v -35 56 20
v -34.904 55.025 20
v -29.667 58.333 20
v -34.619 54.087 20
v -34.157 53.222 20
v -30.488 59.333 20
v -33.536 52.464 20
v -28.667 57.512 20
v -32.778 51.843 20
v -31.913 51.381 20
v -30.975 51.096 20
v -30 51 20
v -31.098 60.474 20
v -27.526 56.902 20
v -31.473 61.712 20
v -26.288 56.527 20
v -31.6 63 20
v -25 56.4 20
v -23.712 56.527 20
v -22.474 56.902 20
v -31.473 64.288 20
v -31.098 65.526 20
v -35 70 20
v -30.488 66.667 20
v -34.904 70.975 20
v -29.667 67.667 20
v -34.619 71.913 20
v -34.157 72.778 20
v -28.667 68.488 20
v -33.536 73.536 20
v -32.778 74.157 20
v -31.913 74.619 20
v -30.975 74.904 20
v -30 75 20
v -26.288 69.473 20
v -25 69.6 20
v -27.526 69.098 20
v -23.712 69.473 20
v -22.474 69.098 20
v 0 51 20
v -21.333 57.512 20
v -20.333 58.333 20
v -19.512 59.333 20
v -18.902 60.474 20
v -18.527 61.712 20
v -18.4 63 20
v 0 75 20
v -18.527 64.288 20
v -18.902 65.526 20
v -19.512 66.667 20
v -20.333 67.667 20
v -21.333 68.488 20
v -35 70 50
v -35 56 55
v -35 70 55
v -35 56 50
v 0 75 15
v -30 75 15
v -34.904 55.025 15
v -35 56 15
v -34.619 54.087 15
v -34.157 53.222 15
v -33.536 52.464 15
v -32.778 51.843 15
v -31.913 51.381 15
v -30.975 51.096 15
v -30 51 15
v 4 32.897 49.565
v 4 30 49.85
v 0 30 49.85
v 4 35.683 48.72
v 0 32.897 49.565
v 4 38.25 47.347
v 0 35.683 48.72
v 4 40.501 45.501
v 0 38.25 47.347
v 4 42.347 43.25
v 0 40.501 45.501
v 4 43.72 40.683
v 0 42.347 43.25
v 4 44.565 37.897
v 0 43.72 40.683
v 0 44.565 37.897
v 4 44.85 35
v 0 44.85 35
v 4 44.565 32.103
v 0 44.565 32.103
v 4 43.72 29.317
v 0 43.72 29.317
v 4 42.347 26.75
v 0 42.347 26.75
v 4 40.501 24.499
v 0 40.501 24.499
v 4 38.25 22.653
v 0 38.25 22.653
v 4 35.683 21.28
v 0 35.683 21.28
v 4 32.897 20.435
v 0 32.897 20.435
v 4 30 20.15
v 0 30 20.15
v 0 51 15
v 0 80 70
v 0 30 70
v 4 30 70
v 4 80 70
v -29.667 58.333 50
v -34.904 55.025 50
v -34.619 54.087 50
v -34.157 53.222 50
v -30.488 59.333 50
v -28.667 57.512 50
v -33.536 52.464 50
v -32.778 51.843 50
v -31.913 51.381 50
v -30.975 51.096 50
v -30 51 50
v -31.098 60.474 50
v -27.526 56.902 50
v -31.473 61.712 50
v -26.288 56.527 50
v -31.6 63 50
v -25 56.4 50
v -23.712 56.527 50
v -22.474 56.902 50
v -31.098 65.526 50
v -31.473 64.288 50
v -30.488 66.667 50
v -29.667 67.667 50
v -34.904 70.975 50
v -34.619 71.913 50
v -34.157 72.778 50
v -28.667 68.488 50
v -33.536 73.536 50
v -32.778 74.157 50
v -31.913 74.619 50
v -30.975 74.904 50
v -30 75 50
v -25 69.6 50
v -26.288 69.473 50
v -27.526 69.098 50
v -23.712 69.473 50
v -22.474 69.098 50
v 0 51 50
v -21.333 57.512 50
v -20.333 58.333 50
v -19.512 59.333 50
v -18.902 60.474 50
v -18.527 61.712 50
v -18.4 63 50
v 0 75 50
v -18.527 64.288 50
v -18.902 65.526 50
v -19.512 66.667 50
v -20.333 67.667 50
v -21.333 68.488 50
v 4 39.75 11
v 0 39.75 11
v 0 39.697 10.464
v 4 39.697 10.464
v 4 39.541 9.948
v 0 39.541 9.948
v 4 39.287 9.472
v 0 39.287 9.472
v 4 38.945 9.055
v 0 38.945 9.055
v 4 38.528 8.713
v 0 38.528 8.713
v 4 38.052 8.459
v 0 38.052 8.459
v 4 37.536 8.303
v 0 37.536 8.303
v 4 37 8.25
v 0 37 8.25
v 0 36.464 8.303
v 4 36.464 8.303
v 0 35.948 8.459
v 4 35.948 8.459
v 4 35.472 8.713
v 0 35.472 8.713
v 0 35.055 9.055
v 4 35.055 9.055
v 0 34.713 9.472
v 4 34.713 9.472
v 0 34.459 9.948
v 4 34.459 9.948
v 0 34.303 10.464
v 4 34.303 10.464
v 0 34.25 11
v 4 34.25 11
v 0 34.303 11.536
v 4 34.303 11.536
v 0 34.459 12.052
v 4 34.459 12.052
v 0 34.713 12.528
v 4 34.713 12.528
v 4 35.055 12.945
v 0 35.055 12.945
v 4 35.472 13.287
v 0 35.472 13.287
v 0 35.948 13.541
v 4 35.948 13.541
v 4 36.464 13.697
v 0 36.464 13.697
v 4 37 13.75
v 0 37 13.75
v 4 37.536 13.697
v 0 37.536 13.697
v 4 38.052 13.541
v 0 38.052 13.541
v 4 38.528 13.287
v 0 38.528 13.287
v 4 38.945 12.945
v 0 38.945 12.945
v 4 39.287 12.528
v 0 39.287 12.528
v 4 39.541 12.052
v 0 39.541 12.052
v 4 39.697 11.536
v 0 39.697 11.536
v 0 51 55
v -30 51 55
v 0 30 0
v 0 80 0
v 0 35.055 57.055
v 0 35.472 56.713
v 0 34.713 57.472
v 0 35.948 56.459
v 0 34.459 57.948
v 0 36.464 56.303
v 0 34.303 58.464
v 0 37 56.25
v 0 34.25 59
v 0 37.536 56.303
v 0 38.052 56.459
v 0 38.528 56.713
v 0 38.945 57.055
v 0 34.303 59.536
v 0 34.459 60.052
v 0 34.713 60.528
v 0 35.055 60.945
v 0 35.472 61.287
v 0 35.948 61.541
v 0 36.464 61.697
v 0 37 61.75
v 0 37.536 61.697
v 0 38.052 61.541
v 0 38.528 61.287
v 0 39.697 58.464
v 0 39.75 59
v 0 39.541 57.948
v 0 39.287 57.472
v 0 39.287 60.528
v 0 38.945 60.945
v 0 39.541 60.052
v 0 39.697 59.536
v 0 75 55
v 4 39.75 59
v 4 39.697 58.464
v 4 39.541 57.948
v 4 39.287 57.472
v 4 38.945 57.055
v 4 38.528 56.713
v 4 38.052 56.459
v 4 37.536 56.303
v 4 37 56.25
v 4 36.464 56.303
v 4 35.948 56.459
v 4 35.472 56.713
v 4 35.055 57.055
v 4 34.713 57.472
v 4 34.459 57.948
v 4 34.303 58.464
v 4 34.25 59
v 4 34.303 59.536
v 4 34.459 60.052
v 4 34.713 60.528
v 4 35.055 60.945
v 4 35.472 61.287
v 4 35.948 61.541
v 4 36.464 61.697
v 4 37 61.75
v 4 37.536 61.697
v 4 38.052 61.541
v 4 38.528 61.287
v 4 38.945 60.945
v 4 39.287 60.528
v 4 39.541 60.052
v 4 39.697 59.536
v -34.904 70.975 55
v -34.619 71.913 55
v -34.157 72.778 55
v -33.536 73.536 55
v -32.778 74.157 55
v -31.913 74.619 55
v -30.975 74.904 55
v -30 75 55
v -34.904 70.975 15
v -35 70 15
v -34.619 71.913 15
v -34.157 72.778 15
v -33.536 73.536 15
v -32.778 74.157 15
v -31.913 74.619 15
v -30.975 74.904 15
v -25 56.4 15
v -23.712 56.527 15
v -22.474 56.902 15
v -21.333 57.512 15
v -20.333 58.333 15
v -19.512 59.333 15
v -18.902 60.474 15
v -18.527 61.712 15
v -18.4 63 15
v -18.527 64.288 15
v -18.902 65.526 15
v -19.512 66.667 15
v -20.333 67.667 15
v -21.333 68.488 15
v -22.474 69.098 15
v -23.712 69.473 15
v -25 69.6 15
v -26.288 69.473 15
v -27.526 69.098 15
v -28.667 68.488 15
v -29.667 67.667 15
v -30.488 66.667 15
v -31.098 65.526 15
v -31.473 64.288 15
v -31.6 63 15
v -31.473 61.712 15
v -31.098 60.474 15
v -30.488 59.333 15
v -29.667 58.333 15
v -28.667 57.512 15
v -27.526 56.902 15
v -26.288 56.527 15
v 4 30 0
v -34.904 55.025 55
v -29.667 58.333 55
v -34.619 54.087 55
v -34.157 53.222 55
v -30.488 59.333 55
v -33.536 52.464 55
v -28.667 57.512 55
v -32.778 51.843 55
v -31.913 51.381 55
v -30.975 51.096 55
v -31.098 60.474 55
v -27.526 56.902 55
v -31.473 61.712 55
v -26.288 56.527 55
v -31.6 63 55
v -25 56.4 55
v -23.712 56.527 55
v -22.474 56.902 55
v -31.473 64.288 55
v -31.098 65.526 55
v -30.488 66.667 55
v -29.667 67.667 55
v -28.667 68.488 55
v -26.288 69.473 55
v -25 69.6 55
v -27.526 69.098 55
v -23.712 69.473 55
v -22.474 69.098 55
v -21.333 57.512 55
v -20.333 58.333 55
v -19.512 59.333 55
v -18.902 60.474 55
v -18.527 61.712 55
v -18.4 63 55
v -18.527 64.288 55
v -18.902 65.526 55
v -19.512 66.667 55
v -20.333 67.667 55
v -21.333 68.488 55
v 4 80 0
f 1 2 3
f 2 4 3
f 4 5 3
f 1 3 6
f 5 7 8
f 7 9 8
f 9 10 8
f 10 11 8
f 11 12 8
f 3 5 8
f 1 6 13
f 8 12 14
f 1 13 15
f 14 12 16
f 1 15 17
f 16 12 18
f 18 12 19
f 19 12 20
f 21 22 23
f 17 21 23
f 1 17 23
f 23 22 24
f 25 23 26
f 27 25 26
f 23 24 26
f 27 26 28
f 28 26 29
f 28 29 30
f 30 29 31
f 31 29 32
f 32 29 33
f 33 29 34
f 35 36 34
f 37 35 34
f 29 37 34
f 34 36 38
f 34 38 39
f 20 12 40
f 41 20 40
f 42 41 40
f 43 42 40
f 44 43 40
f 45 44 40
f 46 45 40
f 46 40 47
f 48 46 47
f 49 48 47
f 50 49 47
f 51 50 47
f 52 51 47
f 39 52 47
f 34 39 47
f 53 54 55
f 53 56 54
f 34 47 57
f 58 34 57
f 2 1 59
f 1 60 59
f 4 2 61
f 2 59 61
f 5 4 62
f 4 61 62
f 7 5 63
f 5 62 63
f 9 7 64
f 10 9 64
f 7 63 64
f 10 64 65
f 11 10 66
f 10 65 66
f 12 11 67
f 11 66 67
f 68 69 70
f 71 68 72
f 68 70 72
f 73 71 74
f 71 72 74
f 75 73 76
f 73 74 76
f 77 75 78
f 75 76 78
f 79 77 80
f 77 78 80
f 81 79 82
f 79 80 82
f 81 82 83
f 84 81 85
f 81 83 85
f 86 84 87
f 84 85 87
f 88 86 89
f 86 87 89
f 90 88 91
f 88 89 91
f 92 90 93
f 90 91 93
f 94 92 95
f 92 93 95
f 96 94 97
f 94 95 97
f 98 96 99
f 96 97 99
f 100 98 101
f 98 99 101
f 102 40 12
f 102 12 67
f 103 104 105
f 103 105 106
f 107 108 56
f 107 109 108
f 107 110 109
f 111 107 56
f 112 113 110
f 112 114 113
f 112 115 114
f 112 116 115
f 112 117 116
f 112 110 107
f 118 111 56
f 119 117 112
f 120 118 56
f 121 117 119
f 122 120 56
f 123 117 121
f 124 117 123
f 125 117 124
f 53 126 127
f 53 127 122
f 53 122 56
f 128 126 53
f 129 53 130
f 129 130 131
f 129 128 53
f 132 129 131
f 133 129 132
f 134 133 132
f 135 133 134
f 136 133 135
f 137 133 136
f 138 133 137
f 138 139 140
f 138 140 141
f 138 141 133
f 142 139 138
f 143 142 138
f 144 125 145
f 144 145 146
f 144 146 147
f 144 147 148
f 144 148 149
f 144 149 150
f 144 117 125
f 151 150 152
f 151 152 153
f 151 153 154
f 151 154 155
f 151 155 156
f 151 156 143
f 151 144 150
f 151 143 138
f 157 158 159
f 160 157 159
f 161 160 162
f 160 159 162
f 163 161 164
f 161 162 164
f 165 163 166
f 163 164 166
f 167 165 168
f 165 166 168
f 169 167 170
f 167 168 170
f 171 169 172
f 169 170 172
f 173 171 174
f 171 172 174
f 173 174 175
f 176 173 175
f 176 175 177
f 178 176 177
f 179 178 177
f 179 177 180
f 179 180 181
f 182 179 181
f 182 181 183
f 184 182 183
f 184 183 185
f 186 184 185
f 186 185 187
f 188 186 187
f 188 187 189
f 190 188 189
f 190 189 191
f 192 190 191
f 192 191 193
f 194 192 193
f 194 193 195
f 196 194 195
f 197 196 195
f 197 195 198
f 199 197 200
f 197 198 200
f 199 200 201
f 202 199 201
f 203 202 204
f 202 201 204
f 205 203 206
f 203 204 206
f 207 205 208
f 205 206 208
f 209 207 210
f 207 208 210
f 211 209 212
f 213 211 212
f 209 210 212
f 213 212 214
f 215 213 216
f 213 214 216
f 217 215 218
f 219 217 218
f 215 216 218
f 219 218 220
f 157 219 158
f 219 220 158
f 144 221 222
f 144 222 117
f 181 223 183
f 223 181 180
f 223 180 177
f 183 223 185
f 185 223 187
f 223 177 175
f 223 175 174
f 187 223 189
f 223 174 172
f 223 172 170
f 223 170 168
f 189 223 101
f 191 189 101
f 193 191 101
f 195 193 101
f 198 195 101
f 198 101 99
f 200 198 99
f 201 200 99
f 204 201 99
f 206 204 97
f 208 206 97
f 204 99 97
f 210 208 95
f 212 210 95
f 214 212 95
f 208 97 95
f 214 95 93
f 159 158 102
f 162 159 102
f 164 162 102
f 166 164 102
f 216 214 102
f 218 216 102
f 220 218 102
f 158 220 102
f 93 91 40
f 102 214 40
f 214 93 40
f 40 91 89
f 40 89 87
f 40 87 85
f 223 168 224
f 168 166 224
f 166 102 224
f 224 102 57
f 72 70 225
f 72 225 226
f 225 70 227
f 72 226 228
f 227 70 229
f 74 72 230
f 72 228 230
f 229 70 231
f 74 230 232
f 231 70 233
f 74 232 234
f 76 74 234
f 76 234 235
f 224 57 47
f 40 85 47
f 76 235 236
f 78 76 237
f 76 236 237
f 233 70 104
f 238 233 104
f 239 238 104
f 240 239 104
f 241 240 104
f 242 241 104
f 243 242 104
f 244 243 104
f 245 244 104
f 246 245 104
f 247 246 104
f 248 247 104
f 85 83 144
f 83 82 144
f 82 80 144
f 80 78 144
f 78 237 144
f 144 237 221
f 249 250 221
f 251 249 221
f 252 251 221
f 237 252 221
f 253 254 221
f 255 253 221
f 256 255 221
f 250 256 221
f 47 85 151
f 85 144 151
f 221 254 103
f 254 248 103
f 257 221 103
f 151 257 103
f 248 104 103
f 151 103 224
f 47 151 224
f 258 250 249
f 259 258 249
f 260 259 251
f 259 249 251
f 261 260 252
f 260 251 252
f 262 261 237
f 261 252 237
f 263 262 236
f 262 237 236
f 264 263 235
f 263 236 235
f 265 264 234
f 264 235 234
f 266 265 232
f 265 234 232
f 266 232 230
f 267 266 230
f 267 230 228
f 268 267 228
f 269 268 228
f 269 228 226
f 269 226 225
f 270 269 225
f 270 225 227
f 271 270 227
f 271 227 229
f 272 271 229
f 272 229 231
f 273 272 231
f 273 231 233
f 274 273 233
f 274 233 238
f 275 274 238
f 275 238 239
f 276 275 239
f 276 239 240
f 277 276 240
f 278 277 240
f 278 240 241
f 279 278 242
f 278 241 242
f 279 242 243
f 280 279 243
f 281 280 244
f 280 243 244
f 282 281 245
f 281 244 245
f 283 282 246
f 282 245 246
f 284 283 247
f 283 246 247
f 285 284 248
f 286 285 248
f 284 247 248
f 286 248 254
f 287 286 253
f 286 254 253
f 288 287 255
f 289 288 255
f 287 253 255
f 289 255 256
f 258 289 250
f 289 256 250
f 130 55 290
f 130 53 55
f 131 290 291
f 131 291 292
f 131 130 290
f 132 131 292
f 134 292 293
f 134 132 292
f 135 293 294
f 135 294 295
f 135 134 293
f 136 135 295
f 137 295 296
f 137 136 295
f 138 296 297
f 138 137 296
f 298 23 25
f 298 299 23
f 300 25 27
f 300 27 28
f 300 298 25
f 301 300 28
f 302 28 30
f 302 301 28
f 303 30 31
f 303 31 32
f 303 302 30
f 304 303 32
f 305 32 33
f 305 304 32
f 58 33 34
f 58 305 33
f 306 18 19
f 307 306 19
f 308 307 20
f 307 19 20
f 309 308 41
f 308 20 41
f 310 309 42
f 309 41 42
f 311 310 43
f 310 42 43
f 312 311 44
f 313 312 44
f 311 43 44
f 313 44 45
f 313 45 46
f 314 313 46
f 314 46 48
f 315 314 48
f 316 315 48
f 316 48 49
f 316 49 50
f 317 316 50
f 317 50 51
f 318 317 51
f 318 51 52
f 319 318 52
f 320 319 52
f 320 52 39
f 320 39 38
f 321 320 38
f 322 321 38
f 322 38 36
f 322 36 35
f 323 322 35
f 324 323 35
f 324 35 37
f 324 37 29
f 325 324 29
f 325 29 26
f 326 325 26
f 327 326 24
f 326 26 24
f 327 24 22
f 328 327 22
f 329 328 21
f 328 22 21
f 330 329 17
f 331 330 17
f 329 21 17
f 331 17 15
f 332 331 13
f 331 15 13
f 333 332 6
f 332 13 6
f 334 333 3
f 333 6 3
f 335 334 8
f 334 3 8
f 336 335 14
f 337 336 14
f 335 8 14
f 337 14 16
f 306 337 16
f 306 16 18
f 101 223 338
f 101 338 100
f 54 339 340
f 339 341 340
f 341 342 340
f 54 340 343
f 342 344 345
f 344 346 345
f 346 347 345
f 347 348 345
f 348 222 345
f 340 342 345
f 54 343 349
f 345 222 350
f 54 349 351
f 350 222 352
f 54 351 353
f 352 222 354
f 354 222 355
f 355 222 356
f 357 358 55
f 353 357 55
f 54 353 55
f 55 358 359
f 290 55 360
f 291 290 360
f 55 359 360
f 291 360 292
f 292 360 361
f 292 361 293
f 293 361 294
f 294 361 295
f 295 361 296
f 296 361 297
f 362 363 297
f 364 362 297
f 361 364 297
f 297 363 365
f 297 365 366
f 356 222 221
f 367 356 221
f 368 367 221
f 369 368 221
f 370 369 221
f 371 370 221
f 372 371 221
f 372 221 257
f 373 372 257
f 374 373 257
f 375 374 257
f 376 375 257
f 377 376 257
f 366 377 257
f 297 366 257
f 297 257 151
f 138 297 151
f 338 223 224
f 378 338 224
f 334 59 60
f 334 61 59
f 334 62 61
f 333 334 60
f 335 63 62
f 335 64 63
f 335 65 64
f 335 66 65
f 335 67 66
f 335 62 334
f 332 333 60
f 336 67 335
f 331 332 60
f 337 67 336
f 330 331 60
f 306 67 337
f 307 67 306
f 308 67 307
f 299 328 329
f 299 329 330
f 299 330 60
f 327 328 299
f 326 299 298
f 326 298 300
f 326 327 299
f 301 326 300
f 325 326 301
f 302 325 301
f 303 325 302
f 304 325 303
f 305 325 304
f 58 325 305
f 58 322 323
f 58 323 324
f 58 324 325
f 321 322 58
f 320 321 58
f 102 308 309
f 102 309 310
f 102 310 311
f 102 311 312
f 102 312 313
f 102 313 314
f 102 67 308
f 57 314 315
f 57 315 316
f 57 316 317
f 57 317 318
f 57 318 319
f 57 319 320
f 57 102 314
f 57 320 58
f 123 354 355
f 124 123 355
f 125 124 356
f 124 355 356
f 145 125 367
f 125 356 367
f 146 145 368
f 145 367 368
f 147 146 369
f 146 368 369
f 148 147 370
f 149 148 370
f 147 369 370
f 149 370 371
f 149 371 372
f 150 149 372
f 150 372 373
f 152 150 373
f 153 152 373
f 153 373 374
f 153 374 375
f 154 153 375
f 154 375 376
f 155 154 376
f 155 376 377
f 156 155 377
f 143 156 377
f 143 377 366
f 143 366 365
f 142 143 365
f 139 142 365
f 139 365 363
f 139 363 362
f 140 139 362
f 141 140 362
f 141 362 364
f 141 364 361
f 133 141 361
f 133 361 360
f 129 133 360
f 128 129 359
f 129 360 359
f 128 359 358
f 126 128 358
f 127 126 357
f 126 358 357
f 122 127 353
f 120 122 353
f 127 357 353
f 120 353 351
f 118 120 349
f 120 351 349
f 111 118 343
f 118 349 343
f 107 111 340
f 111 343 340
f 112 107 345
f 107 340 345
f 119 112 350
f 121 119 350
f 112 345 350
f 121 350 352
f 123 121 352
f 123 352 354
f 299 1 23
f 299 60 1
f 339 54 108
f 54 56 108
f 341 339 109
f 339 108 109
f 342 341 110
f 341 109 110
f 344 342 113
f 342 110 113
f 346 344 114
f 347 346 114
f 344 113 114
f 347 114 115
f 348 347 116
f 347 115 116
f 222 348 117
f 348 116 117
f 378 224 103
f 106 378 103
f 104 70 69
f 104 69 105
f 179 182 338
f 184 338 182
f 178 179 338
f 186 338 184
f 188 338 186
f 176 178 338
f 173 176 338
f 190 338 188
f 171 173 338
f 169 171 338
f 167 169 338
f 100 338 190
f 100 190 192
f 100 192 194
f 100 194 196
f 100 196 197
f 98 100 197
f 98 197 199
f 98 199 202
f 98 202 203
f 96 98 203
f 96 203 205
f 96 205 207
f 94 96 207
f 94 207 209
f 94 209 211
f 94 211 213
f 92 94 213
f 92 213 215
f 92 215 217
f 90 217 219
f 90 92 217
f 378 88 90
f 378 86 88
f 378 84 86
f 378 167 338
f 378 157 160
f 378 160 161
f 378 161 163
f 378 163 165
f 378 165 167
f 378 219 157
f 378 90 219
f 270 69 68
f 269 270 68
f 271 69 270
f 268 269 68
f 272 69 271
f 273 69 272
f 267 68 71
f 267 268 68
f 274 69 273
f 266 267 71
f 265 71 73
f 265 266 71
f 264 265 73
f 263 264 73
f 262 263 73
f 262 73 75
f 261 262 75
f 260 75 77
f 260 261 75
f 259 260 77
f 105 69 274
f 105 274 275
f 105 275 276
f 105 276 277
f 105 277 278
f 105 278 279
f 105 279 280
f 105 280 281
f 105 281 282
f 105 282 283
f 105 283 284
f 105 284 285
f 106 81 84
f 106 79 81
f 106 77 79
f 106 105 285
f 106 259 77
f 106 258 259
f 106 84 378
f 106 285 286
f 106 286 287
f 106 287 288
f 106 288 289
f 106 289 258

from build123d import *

# Parameters (mm, degrees)
SKETCH003_W   = 24
SKETCH003_H   = 5
PAD002_DEPTH  = 35
SKETCH004_R   = 6.6
HOLE001_DEPTH = 5.001
FILLET002_R   = 5
FILLET003_R   = 5
SKETCH002_W   = 24
SKETCH002_H   = 5
PAD001_DEPTH  = 35
SKETCH005_R   = 6.6
HOLE002_DEPTH = 5.001
FILLET_R      = 5
FILLET001_R   = 5
SKETCH_W      = 50
SKETCH_H      = 70
PAD_DEPTH     = 4
SKETCH001_R   = 2.75
HOLE_DEPTH    = 4.001
SKETCH006_R   = 14.85
HOLE003_DEPTH = 4.001


with BuildPart() as body002:
    # Sketch003 (on Face1 of CopyHole001) → Pad002 (new body)
    with BuildSketch(Plane(origin=(0, 0, 0), x_dir=(0, 1, 0), z_dir=(-1, 0, 0))):
        with Locations((63, -52.5)):
            Rectangle(SKETCH003_W, SKETCH003_H)
    extrude(amount=PAD002_DEPTH)

    # Sketch004 (on Face3 of Pad002) → Hole001 (cut, through all)
    with BuildSketch(Plane(origin=(0, 0, 55), x_dir=(0, -1, 0), z_dir=(0, 0, 1))):
        with Locations((-63, -25)):
            Circle(SKETCH004_R)
    extrude(amount=-HOLE001_DEPTH, mode=Mode.SUBTRACT)

    # Fillet002
    fillet002_edges = [body002.edges().sort_by_distance(p)[0] for p in [
        (-35, 75, 52.5),
    ]]
    fillet(fillet002_edges, radius=FILLET002_R)

    # Fillet003
    fillet003_edges = [body002.edges().sort_by_distance(p)[0] for p in [
        (-35, 51, 52.5),
    ]]
    fillet(fillet003_edges, radius=FILLET003_R)


with BuildPart() as body001:
    # Sketch002 (on Face1 of CopyHole) → Pad001 (new body)
    with BuildSketch(Plane(origin=(0, 0, 0), x_dir=(0, 1, 0), z_dir=(-1, 0, 0))):
        with Locations((63, -17.5)):
            Rectangle(SKETCH002_W, SKETCH002_H)
    extrude(amount=PAD001_DEPTH)

    # Sketch005 (on Face3 of Pad001) → Hole002 (cut, through all)
    with BuildSketch(Plane(origin=(0, 0, 20), x_dir=(0, -1, 0), z_dir=(0, 0, 1))):
        with Locations((-63, -25)):
            Circle(SKETCH005_R)
    extrude(amount=-HOLE002_DEPTH, mode=Mode.SUBTRACT)

    # Fillet
    fillet_edges = [body001.edges().sort_by_distance(p)[0] for p in [
        (-35, 75, 17.5),
    ]]
    fillet(fillet_edges, radius=FILLET_R)

    # Fillet001
    fillet001_edges = [body001.edges().sort_by_distance(p)[0] for p in [
        (-35, 51, 17.5),
    ]]
    fillet(fillet001_edges, radius=FILLET001_R)


with BuildPart() as body:
    # Sketch → Pad (new body)
    with BuildSketch(Plane.YZ):
        with Locations((55, 35)):
            Rectangle(SKETCH_W, SKETCH_H)
    extrude(amount=PAD_DEPTH)

    # Sketch001 (on Face5 of Pad) → Hole (cut, through all)
    with BuildSketch(Plane(origin=(0, 0, 0), x_dir=(0, 1, 0), z_dir=(-1, 0, 0))):
        with Locations((37, -11)):
            Circle(SKETCH001_R)
        with Locations((37, -59)):
            Circle(SKETCH001_R)
    extrude(amount=-HOLE_DEPTH, mode=Mode.SUBTRACT)

    # Sketch006 (on Face4 of Hole) → Hole003 (cut, through all)
    with BuildSketch(Plane(origin=(0, 0, 0), x_dir=(0, 1, 0), z_dir=(-1, 0, 0))):
        with Locations((30, -35)):
            Circle(SKETCH006_R)
    extrude(amount=-HOLE003_DEPTH, mode=Mode.SUBTRACT)

    # Boolean: union Body002, Body001
    add(body002.part)
    add(body001.part)


solid = body.part
